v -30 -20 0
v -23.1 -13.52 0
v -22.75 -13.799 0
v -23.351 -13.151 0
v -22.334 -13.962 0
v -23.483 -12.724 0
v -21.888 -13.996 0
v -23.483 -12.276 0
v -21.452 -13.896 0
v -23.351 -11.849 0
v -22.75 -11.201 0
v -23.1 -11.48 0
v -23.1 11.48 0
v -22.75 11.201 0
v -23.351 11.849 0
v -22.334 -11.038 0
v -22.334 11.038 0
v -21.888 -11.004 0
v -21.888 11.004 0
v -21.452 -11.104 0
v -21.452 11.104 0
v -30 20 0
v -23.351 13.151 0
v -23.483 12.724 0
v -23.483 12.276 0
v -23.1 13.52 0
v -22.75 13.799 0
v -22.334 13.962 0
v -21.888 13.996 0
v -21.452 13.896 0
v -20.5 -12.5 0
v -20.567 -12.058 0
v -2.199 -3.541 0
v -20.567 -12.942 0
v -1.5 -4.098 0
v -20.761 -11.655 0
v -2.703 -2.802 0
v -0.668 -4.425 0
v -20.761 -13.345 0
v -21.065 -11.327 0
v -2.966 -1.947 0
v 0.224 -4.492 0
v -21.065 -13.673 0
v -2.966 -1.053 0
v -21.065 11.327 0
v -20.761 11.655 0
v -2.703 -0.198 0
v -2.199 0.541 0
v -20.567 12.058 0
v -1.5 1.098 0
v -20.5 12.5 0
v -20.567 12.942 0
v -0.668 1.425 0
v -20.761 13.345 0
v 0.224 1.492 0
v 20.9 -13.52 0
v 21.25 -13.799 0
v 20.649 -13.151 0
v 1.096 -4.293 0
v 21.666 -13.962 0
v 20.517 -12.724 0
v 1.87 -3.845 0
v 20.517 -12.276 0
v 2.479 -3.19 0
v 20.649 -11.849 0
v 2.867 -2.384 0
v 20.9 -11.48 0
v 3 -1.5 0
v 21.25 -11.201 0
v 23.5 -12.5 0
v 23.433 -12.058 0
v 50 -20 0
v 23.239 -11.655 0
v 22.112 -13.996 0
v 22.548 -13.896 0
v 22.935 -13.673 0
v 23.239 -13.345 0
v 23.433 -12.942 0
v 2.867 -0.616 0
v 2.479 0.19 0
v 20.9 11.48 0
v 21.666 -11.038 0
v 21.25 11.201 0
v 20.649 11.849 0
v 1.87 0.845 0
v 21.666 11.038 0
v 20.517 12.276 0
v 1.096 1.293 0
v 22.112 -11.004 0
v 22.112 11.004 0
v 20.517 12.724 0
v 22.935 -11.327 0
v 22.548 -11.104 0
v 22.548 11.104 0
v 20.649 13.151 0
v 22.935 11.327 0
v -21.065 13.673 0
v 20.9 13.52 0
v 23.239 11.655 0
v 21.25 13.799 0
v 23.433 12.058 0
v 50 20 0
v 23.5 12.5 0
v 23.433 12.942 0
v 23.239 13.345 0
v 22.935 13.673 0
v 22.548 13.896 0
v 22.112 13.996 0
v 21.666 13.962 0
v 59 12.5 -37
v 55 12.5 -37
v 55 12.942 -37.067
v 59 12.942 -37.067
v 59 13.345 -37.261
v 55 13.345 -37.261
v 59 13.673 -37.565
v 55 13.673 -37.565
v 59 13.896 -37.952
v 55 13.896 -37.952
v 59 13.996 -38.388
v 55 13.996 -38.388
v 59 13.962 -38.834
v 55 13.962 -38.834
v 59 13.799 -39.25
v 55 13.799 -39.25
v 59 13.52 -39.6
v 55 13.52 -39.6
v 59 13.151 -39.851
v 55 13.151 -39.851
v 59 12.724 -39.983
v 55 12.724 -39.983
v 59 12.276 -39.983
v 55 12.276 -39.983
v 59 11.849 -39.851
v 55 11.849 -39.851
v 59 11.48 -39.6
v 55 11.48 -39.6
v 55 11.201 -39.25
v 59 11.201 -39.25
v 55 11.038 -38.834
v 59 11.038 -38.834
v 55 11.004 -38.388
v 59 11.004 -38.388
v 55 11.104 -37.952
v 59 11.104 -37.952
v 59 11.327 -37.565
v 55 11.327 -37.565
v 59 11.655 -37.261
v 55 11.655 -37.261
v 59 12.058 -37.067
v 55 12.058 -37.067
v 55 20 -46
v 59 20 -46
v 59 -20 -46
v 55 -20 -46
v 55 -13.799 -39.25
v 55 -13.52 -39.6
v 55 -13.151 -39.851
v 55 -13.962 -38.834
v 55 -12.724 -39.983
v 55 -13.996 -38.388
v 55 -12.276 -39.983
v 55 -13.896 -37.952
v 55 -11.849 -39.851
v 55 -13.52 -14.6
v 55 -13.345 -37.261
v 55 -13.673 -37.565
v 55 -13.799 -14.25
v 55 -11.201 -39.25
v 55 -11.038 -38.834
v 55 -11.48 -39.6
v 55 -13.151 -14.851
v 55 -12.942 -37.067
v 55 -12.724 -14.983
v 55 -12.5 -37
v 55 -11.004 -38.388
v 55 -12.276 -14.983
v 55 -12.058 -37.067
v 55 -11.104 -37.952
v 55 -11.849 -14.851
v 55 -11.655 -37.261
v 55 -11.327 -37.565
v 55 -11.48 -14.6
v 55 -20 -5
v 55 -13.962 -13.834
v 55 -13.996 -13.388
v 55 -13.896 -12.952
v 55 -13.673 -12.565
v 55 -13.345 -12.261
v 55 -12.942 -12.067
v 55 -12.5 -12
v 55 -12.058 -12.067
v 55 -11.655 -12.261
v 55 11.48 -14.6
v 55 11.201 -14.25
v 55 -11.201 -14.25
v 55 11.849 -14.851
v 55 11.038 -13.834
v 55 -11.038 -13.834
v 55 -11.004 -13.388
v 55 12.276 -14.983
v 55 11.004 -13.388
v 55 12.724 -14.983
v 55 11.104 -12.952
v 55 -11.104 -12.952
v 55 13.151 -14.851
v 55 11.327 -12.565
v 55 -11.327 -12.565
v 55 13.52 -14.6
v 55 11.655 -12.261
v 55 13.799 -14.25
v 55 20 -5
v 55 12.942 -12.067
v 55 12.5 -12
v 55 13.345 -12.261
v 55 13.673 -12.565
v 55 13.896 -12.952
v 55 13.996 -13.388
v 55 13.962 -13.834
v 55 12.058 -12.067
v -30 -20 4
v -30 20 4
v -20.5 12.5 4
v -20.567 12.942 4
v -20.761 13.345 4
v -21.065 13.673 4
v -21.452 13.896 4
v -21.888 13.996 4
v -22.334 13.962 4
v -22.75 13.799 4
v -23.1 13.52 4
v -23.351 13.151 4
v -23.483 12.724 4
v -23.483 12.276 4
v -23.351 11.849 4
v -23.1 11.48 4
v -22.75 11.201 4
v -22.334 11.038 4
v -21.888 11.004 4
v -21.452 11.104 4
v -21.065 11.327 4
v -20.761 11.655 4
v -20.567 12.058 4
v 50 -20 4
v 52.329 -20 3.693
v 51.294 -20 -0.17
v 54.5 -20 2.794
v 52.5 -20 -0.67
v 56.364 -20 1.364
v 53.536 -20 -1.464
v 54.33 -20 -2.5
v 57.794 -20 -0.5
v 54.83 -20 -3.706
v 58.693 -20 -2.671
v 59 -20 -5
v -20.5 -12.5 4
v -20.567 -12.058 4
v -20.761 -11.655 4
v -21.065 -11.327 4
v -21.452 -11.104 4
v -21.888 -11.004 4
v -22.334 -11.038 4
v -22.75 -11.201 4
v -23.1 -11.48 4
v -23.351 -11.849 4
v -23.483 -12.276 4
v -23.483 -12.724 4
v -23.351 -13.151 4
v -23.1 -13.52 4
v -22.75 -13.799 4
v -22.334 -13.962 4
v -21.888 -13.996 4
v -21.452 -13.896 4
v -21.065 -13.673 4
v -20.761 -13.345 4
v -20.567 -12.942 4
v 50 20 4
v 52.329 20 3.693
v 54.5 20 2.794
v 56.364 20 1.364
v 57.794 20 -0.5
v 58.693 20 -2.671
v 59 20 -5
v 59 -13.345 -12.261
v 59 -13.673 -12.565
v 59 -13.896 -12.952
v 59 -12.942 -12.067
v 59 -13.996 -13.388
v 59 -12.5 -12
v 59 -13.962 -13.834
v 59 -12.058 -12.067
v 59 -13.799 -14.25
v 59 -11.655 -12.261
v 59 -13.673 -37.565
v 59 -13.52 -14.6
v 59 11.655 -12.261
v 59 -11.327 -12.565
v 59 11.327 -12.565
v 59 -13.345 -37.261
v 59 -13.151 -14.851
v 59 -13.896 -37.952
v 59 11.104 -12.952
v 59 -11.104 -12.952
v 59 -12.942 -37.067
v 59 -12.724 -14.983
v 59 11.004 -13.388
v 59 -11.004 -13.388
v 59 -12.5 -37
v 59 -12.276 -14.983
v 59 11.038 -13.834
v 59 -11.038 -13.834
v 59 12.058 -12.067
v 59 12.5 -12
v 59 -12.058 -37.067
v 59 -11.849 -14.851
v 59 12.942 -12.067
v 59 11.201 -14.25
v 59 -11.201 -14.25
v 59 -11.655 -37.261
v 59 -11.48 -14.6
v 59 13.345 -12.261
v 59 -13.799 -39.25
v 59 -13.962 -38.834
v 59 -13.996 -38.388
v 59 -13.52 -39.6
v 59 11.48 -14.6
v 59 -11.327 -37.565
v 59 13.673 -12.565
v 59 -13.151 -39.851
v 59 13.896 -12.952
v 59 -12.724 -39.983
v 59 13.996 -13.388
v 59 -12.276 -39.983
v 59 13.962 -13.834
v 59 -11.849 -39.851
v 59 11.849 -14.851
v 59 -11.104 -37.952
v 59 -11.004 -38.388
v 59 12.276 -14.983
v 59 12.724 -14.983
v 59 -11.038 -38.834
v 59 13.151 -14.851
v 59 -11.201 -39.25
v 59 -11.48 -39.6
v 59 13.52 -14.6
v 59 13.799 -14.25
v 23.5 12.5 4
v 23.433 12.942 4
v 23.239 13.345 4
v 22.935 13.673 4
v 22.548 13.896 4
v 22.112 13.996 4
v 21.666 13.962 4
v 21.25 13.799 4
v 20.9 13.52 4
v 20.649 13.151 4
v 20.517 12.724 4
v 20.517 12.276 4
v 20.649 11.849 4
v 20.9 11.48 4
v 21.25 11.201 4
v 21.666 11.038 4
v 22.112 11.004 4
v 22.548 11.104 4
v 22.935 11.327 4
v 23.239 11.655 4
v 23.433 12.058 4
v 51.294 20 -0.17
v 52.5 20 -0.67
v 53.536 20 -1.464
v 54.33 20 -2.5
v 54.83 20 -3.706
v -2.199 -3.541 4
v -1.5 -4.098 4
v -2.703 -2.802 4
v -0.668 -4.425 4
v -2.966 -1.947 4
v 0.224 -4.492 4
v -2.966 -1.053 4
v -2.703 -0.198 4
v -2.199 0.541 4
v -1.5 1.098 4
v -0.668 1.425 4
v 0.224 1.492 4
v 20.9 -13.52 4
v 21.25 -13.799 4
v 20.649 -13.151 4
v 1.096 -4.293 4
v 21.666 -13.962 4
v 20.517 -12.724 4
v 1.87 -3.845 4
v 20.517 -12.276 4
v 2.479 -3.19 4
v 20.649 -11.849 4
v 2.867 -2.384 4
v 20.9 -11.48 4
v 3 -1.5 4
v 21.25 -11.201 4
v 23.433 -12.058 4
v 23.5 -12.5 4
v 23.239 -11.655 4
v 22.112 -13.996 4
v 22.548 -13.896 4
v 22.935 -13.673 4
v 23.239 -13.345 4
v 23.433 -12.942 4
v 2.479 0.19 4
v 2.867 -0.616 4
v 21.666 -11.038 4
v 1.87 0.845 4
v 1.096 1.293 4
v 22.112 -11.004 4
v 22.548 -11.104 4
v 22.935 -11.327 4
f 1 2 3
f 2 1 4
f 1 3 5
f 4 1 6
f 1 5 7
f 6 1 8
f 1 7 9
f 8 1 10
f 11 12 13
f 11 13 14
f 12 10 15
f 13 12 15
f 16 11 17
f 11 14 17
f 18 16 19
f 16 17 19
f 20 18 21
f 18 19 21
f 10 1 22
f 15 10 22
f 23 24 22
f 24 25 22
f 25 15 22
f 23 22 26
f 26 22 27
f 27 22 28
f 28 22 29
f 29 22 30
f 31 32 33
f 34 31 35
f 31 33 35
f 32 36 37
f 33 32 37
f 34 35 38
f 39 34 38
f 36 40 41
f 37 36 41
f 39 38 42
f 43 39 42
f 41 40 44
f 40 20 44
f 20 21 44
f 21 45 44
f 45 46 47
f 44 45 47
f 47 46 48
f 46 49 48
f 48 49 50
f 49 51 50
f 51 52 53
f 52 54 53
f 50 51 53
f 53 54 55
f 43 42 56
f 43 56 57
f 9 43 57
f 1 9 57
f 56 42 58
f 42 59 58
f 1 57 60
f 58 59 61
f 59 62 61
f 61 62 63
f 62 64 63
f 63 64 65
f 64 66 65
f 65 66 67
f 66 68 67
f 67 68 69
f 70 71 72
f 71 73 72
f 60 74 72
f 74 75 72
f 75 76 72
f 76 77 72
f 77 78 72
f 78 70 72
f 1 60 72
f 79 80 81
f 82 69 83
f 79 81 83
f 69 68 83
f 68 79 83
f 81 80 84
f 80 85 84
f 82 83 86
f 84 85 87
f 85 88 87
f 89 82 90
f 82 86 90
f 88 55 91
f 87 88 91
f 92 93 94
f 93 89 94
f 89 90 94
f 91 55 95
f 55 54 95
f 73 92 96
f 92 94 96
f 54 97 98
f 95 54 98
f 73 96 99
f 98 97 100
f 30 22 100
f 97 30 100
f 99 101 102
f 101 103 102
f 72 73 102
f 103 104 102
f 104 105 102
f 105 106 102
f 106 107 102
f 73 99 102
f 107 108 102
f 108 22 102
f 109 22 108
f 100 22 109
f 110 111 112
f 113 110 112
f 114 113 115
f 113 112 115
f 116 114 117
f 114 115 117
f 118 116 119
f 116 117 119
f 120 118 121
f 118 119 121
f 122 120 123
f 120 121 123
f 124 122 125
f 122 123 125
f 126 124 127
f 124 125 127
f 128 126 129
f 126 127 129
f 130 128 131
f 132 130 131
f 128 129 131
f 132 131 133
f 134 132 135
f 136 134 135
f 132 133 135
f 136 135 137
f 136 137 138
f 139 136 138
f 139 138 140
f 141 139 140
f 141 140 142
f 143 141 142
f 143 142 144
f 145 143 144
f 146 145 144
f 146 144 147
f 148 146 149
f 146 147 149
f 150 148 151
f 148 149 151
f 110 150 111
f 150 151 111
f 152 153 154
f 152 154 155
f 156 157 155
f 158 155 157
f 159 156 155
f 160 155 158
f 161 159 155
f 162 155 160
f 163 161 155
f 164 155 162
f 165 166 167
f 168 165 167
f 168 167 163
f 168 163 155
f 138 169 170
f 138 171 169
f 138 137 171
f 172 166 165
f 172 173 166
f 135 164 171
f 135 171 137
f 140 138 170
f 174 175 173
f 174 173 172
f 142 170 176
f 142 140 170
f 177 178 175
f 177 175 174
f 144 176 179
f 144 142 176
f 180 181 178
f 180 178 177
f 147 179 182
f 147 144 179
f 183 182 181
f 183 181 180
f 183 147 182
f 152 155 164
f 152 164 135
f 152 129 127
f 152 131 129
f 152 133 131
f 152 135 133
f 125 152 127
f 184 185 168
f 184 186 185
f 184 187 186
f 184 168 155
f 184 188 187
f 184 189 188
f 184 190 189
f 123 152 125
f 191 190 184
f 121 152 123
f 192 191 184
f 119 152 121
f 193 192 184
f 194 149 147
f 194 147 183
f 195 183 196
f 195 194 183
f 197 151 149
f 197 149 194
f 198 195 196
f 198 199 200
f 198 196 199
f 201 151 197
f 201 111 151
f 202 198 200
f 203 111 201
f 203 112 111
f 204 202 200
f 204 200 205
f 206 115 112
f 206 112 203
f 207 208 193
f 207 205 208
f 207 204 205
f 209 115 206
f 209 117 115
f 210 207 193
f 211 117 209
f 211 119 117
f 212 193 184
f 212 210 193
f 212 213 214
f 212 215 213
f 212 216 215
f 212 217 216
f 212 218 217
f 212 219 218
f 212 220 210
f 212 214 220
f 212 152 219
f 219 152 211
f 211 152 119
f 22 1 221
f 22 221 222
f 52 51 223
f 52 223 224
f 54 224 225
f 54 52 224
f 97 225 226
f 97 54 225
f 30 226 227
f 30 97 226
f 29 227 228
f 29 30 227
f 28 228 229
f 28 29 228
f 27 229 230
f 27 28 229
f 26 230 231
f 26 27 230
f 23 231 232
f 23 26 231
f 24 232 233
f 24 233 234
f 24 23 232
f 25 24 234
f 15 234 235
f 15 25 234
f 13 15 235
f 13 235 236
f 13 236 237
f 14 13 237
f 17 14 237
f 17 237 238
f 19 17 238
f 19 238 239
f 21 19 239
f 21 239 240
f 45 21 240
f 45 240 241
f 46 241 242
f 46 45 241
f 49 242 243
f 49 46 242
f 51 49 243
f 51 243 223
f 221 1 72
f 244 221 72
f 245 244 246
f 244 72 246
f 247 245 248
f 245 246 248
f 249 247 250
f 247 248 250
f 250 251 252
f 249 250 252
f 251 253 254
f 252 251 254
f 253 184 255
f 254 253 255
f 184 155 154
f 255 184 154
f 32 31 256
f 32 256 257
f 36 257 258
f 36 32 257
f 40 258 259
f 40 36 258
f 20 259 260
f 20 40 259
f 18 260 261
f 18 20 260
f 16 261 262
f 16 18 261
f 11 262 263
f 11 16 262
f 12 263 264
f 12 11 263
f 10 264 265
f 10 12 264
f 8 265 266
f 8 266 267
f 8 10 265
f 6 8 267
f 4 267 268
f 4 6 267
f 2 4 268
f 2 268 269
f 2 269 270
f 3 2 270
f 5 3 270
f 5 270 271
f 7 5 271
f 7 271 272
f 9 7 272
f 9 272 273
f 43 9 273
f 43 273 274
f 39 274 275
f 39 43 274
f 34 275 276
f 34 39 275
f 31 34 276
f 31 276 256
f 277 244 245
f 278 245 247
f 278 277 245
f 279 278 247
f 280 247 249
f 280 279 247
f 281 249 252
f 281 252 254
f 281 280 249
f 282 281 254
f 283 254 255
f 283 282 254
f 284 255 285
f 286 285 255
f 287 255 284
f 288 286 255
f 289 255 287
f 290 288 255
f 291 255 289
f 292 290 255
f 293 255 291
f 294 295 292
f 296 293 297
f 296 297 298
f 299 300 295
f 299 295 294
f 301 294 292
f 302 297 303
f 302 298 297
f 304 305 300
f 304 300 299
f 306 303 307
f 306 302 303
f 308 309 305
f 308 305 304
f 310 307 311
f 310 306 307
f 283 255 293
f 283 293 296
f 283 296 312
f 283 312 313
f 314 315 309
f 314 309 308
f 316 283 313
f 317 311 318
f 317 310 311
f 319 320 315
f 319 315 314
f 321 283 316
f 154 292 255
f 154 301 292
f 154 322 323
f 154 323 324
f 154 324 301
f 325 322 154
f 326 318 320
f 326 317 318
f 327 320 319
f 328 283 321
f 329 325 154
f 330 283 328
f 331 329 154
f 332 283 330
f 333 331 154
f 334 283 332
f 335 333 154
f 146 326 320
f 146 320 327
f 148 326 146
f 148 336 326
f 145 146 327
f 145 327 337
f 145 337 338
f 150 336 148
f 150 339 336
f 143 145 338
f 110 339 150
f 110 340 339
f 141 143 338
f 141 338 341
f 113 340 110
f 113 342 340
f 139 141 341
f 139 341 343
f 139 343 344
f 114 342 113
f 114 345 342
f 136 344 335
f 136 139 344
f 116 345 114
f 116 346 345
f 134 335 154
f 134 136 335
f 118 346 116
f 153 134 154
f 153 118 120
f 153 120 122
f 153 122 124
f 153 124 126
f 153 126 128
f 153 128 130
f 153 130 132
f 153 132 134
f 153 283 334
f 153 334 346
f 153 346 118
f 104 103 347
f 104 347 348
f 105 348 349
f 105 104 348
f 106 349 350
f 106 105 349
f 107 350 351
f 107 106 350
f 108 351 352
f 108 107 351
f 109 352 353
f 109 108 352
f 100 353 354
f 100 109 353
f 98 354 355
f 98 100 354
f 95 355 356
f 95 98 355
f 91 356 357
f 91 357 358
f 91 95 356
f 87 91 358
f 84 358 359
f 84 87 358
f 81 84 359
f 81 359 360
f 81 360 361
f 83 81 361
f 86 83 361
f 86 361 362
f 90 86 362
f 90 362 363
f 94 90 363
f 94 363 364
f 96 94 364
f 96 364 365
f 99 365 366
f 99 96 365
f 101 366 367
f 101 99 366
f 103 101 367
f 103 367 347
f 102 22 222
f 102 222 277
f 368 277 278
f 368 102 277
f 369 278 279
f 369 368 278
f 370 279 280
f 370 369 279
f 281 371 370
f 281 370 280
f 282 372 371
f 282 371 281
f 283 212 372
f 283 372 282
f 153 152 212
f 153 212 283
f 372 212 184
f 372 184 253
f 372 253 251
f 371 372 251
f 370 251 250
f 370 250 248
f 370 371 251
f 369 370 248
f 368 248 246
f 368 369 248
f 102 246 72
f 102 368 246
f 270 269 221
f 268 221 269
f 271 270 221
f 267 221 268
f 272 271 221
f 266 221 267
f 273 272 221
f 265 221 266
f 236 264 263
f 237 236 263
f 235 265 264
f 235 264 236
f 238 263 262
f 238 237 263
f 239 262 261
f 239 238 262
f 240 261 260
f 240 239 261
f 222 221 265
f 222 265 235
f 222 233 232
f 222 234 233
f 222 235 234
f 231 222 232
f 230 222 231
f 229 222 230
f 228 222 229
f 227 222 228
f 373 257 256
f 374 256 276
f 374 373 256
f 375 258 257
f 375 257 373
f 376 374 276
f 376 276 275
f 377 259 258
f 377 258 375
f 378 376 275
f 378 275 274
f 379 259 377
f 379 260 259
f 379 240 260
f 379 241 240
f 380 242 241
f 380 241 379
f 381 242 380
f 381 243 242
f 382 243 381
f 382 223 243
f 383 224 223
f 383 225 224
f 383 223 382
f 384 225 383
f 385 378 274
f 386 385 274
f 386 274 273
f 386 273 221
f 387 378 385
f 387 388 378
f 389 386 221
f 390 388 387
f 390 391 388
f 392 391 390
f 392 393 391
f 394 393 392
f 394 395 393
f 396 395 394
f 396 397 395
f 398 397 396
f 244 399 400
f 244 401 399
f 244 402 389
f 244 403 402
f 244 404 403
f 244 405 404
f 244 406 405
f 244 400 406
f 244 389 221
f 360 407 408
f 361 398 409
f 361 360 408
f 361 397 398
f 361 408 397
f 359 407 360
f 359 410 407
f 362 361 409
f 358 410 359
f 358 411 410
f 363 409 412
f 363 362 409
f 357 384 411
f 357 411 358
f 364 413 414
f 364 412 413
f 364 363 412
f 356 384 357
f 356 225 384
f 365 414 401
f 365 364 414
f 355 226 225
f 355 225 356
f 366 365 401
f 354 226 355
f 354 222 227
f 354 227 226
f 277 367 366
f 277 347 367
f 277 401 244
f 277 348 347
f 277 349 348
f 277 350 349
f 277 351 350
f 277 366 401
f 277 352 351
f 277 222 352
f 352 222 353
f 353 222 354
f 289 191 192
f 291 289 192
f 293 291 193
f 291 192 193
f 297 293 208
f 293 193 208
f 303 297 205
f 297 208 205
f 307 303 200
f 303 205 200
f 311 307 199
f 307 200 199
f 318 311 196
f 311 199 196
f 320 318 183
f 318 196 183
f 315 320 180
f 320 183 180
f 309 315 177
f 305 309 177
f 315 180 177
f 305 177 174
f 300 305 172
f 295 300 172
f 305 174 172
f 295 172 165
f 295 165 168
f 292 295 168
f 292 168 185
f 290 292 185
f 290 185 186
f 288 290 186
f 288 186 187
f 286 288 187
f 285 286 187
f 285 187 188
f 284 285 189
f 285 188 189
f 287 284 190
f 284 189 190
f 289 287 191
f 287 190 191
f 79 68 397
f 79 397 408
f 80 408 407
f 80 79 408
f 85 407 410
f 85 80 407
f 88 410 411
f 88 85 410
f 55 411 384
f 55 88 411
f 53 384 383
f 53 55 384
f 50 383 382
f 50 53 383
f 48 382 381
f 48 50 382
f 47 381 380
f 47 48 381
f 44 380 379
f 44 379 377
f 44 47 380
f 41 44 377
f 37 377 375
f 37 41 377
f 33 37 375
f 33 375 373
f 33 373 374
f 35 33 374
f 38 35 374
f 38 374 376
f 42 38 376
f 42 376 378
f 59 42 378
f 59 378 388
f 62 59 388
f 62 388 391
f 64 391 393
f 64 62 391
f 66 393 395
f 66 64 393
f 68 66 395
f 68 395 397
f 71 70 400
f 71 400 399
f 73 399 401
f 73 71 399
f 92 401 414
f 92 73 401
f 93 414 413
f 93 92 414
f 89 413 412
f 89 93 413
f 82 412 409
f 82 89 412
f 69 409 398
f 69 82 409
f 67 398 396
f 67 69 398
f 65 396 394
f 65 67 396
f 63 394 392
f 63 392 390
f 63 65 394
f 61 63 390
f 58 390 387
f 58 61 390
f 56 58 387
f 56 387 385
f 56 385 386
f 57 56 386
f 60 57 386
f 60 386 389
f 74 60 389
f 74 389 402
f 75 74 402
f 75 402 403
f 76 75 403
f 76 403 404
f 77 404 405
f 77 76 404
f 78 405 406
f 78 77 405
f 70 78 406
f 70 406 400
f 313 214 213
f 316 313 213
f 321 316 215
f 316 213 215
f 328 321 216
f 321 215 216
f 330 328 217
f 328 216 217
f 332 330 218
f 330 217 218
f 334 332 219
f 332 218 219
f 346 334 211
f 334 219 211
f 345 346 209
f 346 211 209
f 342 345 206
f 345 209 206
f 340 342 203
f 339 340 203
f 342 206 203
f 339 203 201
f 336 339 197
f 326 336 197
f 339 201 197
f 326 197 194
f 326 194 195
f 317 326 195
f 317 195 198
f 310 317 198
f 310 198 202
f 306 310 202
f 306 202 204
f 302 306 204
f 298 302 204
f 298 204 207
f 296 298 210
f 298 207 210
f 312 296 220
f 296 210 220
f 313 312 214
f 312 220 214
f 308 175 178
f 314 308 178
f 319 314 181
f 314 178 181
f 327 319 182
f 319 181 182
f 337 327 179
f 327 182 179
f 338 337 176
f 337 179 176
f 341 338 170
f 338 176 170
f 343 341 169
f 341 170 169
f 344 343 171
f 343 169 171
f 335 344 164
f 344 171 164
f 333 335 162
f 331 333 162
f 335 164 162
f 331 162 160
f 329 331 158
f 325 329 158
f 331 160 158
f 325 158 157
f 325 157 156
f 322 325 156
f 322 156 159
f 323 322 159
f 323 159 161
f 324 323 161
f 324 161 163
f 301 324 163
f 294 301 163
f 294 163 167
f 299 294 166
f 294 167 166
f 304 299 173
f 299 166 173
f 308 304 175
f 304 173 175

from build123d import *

# Parameters (mm, degrees)
SKETCH1_W           = 80
SKETCH1_H           = 40
SKETCH1_R           = 1.5
SKETCH1_R_2         = 3
BOSS_EXTRUDE1_DEPTH = 4
EDGE_FLANGE1_DEPTH  = 40
SKETCH13_R          = 1.5
CUT_EXTRUDE1_DEPTH  = 4


# Sheet-metal steps are written as plain solids
with BuildPart() as part:
    # Sketch1 → Boss-Extrude1 (new body)
    with BuildSketch(Plane.XY):
        with Locations((10, 0)):
            Rectangle(SKETCH1_W, SKETCH1_H)
        with Locations((22, 12.5)):
            Circle(SKETCH1_R, mode=Mode.SUBTRACT)
        with Locations((-22, 12.5)):
            Circle(SKETCH1_R, mode=Mode.SUBTRACT)
        with Locations((-22, -12.5)):
            Circle(SKETCH1_R, mode=Mode.SUBTRACT)
        with Locations((22, -12.5)):
            Circle(SKETCH1_R, mode=Mode.SUBTRACT)
        with Locations((0, -1.5)):
            Circle(SKETCH1_R_2, mode=Mode.SUBTRACT)
    extrude(amount=BOSS_EXTRUDE1_DEPTH)

    # Edge-Flange1 section (across the edge) → Edge-Flange1 (add)
    with BuildSketch(Plane(origin=(55, 20, 0), x_dir=(-1, 0, 0), z_dir=(0, -1, 0))):
        with BuildLine():
            Line((-4, 5), (-4, 46))
            Line((-4, 46), (0, 46))
            Line((0, 46), (0, 5))
            ThreePointArc((0, 5), (1.464466094, 1.464466094), (5, 0))
            Line((5, 0), (5, -4))
            ThreePointArc((5, -4), (-1.363961031, -1.363961031), (-4, 5))
        make_face()
    extrude(amount=EDGE_FLANGE1_DEPTH)

    # Sketch13 → Cut-Extrude1 (cut)
    with BuildSketch(Plane.ZY.offset(-55)):
        with Locations((-38.5, 12.5)):
            Circle(SKETCH13_R)
        with Locations((-13.5, 12.5)):
            Circle(SKETCH13_R)
        with Locations((-13.5, -12.5)):
            Circle(SKETCH13_R)
        with Locations((-38.5, -12.5)):
            Circle(SKETCH13_R)
    extrude(amount=-CUT_EXTRUDE1_DEPTH, mode=Mode.SUBTRACT)


solid = part.part
